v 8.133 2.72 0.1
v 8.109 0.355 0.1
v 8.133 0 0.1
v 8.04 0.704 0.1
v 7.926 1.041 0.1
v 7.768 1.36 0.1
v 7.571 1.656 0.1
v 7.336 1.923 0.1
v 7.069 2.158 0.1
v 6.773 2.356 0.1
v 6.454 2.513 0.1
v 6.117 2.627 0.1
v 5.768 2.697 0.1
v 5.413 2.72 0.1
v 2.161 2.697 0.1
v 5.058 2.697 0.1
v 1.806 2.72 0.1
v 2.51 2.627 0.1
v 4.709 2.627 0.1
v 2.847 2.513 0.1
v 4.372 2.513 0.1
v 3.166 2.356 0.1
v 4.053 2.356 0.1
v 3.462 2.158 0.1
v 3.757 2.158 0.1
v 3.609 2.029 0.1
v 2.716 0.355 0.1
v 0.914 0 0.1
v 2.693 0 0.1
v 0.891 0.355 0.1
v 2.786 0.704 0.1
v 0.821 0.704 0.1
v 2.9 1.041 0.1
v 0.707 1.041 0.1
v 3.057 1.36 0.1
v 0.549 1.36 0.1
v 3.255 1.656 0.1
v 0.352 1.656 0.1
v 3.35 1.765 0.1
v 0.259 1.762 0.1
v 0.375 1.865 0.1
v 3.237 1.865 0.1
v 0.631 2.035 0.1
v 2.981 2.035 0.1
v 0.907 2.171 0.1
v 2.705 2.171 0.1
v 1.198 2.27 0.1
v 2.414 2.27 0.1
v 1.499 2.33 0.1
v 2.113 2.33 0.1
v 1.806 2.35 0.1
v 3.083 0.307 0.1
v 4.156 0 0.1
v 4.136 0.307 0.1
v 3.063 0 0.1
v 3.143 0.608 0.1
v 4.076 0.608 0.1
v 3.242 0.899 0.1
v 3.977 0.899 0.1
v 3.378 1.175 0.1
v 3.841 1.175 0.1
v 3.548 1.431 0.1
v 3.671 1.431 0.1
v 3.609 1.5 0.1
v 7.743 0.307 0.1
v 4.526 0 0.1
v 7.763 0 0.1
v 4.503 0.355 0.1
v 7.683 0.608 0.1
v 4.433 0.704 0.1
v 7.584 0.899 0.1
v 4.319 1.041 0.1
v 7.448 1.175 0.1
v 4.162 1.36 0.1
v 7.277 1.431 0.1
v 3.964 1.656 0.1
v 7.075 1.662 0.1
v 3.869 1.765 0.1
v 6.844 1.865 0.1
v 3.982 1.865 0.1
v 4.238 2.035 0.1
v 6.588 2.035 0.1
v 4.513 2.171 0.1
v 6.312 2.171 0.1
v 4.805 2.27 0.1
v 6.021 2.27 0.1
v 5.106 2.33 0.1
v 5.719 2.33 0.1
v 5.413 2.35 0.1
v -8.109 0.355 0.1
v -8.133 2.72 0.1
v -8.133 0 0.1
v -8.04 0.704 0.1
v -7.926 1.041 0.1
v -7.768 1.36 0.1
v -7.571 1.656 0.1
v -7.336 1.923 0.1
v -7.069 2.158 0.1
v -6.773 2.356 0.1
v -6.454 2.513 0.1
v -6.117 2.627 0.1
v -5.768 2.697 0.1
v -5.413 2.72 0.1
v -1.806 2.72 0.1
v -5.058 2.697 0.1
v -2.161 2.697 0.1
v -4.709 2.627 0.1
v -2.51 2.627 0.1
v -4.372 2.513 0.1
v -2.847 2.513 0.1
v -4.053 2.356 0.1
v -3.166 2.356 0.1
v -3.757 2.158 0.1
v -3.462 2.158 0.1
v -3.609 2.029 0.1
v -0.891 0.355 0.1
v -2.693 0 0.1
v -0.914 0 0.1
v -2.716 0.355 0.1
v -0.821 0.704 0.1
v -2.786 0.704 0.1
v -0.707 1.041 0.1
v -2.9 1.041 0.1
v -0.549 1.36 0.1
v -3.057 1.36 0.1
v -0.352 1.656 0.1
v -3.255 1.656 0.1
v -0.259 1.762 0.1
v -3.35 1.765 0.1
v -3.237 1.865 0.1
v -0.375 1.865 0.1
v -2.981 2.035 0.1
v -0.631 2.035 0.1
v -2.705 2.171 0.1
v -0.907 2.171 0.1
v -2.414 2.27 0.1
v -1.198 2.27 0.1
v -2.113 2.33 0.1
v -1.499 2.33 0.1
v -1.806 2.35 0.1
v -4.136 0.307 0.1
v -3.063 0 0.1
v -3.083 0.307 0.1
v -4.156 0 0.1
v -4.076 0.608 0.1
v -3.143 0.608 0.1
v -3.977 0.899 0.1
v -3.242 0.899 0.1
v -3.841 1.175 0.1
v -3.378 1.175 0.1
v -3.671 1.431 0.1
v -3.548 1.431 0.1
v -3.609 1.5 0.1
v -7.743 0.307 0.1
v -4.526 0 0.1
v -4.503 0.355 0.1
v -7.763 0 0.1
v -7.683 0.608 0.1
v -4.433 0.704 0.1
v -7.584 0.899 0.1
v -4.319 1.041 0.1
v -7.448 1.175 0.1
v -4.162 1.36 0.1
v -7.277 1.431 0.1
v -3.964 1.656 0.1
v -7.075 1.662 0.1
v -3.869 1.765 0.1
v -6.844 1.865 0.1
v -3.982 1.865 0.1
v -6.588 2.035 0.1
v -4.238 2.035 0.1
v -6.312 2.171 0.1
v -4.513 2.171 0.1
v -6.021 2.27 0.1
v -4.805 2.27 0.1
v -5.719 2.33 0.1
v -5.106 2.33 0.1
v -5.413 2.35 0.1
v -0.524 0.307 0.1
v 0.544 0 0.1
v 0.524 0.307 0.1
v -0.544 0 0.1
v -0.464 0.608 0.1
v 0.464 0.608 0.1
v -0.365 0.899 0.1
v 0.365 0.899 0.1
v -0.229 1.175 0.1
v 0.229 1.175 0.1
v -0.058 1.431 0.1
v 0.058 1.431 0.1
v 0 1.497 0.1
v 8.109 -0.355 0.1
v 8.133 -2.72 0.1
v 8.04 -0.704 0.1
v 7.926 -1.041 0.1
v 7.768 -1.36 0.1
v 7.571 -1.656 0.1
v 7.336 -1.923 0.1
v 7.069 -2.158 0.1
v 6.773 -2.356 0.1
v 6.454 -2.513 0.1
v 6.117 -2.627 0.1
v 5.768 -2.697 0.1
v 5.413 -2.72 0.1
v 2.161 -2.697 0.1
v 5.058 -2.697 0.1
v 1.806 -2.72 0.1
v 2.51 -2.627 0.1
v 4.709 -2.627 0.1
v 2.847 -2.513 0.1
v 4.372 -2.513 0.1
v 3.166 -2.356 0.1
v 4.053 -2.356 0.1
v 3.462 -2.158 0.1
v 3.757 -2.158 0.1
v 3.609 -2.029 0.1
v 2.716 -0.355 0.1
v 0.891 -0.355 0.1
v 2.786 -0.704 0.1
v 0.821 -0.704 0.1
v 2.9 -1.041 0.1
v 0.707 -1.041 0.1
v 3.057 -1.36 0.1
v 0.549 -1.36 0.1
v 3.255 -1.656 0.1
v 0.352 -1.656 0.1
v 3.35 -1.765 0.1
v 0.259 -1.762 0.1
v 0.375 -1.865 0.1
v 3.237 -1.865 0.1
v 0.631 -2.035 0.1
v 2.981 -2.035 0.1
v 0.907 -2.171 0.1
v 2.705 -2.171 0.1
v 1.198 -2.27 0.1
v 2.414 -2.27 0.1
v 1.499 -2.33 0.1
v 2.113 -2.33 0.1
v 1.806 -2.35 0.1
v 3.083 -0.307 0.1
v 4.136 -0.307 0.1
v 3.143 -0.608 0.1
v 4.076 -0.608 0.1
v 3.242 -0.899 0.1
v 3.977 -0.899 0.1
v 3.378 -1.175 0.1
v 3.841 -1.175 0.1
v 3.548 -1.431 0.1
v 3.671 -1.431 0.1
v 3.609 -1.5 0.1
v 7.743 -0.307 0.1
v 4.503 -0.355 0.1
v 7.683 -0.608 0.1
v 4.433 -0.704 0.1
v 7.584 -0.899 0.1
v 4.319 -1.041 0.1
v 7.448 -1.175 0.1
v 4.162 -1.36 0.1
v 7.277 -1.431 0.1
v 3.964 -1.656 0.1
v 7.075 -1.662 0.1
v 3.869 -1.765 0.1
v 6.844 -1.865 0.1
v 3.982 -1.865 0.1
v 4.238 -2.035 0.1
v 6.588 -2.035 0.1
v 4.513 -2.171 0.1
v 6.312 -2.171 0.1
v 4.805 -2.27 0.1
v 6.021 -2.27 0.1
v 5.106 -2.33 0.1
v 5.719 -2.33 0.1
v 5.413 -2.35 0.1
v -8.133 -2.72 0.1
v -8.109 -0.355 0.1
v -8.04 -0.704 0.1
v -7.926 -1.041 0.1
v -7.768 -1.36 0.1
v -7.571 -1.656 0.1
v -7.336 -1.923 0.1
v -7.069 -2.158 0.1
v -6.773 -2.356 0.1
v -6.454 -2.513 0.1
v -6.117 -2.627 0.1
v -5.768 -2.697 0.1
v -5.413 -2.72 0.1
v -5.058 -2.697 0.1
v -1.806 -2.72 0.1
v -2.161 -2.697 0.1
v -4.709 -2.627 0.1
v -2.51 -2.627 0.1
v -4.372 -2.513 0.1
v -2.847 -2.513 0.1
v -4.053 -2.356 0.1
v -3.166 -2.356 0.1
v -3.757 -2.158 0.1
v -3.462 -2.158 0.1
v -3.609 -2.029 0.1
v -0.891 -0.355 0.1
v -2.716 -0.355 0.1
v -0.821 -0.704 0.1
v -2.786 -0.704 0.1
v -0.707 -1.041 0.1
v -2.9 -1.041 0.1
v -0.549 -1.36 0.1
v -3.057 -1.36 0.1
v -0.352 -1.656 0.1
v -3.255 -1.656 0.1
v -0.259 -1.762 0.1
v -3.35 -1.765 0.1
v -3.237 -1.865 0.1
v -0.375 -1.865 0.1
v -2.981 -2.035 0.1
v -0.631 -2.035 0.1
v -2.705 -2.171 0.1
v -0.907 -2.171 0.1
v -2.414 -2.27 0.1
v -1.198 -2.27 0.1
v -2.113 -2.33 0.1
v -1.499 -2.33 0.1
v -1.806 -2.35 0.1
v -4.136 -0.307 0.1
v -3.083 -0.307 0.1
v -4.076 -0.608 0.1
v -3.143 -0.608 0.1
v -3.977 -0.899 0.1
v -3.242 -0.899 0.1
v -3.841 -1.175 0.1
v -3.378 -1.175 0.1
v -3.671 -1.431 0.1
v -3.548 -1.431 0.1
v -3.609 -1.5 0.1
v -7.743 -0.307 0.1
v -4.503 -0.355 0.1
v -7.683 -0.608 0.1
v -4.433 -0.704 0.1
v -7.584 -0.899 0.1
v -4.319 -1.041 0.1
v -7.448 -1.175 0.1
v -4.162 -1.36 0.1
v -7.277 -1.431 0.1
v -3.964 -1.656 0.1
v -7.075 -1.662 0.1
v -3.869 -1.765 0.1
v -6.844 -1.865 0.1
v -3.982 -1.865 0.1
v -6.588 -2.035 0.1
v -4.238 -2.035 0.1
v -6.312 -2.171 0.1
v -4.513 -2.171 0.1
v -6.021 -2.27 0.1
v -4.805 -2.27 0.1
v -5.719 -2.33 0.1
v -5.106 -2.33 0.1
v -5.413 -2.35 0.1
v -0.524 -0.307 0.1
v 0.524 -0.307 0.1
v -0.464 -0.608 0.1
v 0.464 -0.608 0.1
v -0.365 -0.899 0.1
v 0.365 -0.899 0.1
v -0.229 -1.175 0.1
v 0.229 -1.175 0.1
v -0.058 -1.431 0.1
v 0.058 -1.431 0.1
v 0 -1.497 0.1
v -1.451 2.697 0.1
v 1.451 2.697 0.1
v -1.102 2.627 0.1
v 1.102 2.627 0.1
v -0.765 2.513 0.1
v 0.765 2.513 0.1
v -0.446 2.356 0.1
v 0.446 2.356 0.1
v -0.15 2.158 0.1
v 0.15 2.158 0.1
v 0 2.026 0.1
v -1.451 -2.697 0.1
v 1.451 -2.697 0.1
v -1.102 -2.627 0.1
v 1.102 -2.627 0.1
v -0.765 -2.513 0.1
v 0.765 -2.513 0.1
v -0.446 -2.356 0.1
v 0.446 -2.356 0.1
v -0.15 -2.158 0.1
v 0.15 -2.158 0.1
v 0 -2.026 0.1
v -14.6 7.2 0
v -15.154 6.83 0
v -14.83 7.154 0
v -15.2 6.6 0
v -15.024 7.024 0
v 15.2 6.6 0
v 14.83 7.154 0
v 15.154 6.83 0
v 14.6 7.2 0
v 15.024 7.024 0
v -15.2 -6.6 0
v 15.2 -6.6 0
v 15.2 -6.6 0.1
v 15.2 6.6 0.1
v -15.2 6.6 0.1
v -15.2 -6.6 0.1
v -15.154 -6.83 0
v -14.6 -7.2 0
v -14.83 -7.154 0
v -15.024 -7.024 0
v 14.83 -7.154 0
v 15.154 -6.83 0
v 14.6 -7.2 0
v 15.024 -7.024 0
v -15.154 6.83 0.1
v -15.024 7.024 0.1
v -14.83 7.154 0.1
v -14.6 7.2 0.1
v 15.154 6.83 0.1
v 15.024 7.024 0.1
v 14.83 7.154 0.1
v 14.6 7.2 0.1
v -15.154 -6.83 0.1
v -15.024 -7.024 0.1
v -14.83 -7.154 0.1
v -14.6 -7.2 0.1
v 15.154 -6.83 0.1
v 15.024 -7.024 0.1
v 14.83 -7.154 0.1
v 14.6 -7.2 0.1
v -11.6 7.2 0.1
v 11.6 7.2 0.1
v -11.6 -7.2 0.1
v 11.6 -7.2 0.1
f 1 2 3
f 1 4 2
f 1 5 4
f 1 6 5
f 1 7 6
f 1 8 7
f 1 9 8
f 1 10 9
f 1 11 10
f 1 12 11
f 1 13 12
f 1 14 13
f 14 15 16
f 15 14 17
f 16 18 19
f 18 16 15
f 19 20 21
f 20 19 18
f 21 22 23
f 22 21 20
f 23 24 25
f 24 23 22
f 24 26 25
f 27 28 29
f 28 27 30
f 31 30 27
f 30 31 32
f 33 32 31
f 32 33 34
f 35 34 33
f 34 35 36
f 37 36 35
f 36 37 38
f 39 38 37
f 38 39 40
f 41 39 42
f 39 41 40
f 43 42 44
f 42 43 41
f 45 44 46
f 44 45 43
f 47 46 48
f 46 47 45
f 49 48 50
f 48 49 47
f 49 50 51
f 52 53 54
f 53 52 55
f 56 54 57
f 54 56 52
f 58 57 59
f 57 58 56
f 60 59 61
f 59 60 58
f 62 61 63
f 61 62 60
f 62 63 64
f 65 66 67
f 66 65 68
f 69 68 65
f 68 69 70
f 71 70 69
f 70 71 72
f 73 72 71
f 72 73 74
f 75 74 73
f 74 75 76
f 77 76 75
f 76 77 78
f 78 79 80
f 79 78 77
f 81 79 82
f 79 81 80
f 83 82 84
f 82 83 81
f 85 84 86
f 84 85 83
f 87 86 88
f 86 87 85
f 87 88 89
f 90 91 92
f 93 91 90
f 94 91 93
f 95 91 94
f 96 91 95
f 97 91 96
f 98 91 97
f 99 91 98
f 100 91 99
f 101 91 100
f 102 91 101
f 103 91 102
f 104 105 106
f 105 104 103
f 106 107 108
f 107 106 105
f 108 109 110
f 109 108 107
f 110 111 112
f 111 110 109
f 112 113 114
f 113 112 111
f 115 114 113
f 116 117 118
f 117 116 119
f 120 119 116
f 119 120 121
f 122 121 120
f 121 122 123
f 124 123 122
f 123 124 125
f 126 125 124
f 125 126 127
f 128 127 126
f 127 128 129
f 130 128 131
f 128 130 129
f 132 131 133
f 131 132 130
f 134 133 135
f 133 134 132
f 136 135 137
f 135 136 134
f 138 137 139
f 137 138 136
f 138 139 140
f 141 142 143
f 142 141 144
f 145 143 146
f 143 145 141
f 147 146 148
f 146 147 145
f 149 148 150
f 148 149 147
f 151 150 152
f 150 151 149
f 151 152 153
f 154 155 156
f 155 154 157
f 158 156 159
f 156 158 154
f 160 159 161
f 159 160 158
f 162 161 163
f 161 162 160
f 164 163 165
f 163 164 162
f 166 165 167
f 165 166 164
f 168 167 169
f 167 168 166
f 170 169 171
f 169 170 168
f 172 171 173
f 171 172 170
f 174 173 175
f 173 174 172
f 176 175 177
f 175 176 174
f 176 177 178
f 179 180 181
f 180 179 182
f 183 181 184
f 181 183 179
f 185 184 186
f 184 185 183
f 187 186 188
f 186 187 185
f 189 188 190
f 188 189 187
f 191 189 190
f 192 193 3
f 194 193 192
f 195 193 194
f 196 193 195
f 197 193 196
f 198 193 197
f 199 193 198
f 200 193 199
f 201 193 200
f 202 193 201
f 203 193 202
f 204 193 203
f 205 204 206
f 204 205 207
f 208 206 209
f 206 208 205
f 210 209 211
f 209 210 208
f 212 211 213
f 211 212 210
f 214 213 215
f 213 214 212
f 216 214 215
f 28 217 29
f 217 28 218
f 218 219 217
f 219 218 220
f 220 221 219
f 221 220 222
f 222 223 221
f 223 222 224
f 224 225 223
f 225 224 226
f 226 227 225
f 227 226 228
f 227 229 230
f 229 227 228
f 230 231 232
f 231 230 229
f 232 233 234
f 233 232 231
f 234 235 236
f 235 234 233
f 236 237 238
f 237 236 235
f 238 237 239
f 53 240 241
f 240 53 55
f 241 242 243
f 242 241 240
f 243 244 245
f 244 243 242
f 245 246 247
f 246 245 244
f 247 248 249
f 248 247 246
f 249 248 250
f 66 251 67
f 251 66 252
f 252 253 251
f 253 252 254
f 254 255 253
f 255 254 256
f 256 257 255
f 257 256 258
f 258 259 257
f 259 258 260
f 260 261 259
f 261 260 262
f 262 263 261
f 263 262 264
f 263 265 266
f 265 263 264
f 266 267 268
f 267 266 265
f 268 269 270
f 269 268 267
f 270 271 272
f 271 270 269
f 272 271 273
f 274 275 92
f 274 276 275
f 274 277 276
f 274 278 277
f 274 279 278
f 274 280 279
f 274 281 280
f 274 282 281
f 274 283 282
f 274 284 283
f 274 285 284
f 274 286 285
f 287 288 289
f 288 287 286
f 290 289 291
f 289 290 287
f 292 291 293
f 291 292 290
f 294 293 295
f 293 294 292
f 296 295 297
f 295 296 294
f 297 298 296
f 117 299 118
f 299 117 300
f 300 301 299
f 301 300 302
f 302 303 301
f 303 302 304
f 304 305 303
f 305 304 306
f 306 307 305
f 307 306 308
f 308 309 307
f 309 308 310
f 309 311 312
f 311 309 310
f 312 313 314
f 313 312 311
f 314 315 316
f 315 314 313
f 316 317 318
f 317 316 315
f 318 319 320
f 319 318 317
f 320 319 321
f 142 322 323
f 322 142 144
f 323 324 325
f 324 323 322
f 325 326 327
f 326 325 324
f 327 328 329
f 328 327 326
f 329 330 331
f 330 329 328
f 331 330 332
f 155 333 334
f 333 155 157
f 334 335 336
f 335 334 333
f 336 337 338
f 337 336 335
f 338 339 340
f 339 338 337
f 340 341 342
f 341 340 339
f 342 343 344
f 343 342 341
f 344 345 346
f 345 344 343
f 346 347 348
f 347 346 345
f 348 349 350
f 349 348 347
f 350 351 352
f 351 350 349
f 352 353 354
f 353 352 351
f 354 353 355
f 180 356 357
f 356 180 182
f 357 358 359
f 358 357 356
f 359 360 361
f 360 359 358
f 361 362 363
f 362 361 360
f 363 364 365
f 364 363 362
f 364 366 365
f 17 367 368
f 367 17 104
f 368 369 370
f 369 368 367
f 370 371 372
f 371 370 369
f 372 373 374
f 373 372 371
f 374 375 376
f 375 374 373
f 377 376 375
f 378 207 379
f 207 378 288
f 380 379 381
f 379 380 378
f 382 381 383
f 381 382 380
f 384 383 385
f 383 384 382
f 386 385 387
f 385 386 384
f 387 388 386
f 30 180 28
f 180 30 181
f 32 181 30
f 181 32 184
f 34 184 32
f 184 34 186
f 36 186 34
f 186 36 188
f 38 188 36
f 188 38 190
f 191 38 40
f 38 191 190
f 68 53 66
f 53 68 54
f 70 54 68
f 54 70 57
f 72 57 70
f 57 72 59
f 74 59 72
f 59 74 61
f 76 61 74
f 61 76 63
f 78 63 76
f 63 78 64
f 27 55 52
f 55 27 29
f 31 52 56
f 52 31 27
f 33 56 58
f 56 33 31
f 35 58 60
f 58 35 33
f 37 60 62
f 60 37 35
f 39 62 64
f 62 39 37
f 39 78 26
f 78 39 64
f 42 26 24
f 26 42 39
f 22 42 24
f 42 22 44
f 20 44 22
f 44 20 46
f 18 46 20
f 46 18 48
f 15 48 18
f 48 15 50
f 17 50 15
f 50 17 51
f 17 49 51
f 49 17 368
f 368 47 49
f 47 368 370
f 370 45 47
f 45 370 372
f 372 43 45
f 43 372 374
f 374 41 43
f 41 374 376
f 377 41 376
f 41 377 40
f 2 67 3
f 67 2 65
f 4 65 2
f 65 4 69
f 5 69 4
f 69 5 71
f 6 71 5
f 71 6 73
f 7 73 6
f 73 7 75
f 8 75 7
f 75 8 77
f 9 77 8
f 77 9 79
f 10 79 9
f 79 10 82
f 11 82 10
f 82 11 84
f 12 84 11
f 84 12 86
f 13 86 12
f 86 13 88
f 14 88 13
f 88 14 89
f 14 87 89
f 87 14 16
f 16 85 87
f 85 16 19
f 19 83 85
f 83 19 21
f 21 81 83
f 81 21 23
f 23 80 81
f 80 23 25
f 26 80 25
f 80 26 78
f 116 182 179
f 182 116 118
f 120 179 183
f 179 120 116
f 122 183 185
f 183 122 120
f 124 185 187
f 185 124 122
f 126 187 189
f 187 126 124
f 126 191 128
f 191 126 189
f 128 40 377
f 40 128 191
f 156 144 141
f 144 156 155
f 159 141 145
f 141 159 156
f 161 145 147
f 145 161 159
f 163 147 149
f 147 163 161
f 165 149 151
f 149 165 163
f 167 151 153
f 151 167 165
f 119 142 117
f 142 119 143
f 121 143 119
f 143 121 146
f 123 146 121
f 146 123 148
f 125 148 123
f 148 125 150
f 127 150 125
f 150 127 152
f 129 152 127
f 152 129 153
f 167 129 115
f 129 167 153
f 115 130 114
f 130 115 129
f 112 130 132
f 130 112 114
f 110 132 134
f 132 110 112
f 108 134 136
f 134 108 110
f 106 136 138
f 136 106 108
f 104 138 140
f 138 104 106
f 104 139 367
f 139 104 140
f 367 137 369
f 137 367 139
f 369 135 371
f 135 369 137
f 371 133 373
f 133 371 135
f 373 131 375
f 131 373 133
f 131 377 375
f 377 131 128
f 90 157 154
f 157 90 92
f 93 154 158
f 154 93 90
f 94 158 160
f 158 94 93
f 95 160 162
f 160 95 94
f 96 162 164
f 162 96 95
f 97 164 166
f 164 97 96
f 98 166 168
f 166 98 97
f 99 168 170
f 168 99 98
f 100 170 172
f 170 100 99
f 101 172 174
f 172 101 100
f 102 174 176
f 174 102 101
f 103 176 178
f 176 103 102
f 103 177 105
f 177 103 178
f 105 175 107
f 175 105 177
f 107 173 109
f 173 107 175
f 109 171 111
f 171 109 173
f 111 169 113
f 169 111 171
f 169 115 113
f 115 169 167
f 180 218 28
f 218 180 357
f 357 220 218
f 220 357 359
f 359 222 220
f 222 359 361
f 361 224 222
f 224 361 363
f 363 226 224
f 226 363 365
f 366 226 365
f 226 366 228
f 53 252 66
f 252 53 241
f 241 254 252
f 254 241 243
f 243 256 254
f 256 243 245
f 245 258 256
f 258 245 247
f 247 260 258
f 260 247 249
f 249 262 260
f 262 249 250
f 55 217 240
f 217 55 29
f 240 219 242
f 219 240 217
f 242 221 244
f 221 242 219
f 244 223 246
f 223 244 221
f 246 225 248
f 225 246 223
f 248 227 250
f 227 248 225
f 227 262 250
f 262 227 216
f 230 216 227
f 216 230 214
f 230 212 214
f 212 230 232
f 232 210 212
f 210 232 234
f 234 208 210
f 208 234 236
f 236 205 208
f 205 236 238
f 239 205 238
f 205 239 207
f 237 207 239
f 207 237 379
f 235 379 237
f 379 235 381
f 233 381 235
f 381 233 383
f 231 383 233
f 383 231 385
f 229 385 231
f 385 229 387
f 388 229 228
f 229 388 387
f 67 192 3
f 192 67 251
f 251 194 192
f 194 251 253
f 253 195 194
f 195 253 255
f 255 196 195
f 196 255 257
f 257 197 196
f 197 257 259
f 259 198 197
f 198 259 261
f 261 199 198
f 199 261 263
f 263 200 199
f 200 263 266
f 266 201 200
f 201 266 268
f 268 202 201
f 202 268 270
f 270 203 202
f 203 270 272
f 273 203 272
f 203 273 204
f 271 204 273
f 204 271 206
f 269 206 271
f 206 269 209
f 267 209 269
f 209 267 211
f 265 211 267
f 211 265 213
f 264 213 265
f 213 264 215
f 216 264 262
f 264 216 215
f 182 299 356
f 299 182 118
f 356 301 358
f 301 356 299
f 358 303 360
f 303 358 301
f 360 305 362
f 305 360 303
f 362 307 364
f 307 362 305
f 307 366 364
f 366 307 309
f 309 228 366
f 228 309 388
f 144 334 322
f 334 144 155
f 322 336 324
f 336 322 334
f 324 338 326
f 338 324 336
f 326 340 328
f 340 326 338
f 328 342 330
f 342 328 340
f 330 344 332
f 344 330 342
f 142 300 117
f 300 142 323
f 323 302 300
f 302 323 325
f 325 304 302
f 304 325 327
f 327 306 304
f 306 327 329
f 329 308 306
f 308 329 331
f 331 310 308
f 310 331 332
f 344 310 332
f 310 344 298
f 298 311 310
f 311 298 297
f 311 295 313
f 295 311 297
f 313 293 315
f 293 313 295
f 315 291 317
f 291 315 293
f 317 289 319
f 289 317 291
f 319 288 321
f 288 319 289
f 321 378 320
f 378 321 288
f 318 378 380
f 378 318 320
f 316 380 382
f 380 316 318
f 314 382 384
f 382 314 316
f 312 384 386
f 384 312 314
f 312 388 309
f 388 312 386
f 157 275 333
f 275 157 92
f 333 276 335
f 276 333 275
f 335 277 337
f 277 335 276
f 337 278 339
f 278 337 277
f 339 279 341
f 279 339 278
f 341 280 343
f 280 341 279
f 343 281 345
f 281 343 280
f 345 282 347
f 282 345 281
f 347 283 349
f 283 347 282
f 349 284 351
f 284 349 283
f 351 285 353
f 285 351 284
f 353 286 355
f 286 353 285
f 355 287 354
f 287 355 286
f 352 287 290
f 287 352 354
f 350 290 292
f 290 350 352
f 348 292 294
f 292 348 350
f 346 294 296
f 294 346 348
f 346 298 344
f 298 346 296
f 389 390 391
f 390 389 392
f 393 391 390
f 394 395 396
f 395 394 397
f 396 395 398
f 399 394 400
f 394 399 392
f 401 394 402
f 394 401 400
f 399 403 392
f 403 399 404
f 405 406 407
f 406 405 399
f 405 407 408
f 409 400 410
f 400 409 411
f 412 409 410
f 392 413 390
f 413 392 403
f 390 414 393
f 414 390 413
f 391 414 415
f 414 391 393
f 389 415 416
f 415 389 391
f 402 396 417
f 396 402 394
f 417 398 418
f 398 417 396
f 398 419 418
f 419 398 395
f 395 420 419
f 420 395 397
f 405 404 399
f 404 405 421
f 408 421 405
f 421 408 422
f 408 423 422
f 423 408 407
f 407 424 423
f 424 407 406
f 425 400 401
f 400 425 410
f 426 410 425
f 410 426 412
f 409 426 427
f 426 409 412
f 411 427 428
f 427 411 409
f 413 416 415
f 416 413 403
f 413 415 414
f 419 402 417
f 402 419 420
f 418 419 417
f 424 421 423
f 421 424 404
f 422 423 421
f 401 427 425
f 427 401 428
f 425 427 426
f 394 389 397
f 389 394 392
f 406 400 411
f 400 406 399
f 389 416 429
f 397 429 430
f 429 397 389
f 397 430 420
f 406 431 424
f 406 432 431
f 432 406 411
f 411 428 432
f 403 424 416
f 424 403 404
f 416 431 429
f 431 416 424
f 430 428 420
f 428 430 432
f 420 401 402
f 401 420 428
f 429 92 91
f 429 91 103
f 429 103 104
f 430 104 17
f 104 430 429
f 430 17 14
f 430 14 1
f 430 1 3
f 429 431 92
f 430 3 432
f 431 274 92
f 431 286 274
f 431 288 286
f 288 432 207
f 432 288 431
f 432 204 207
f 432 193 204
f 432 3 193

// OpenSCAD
use <../lib.scad>
use <../p/1-4chrd.scad>
use <../p/1-4cyli.scad>
use <../p/box3u12.scad>
use <../p/logo-audi-ring-outerbox.scad>
use <../p/logo-audi-ring.scad>
function ldraw_lib__6142271j() = [
// 0 Sticker  1.8 x  3.8 with White Audi Logo on Red Stripe on White Background
// 0 Name: 6142271j.dat
// 0 Author: Massimo Maso [Sirio]
// 0 !LDRAW_ORG Part UPDATE 2025-02
// 0 !LICENSE Licensed under CC BY 4.0 : see CAreadme.txt
// 
// 0 BFC CERTIFY CCW
  [0,"BFC","CERTIFY"],
  [0,"BFC","CCW"],
// 
// 0 !KEYWORDS Bricklink 75873stk01a, Brickowl 427960, LMS, R8, Rebrickable 24755
// 0 !KEYWORDS Set 75873, Speed Champions, Ultra
// 
// 0 !HISTORY 2025-02-27 [OrionP] Official Update 2025-02
// 
// 0 // Logo primitives
// 1 4 0 -.25 0 .68 0 0 0 1 0 0 0 .68 logo-audi-ring-outerbox.dat
  [1,4,0,-.25,0,.68,0,0,0,1,0,0,0,.68, ldraw_lib__logo_audi_ring_outerbox()],
// 1 15 0 -.25 0 .68 0 0 0 1 0 0 0 .68 logo-audi-ring.dat
  [1,15,0,-.25,0,.68,0,0,0,1,0,0,0,.68, ldraw_lib__logo_audi_ring()],
// 0 // Primitives
// 1 16 -36.5 0 16.5 -1.5 0 0 0 -1 0 0 0 1.5 1-4chrd.dat
  [1,16,-36.5,0,16.5,-1.5,0,0,0,-1,0,0,0,1.5, ldraw_lib__1_4chrd()],
// 1 16 36.5 0 16.5 1.5 0 0 0 -1 0 0 0 1.5 1-4chrd.dat
  [1,16,36.5,0,16.5,1.5,0,0,0,-1,0,0,0,1.5, ldraw_lib__1_4chrd()],
// 1 16 0 -.25 0 0 0 38 0 .25 0 16.5 0 0 box3u12.dat
  [1,16,0,-.25,0,0,0,38,0,.25,0,16.5,0,0, ldraw_lib__box3u12()],
// 1 16 -36.5 0 -16.5 -1.5 0 0 0 -1 0 0 0 -1.5 1-4chrd.dat
  [1,16,-36.5,0,-16.5,-1.5,0,0,0,-1,0,0,0,-1.5, ldraw_lib__1_4chrd()],
// 1 16 36.5 0 -16.5 1.5 0 0 0 -1 0 0 0 -1.5 1-4chrd.dat
  [1,16,36.5,0,-16.5,1.5,0,0,0,-1,0,0,0,-1.5, ldraw_lib__1_4chrd()],
// 1 16 -36.5 0 16.5 -1.5 0 0 0 -.25 0 0 0 1.5 1-4cyli.dat
  [1,16,-36.5,0,16.5,-1.5,0,0,0,-.25,0,0,0,1.5, ldraw_lib__1_4cyli()],
// 1 16 36.5 0 16.5 1.5 0 0 0 -.25 0 0 0 1.5 1-4cyli.dat
  [1,16,36.5,0,16.5,1.5,0,0,0,-.25,0,0,0,1.5, ldraw_lib__1_4cyli()],
// 1 16 -36.5 0 -16.5 -1.5 0 0 0 -.25 0 0 0 -1.5 1-4cyli.dat
  [1,16,-36.5,0,-16.5,-1.5,0,0,0,-.25,0,0,0,-1.5, ldraw_lib__1_4cyli()],
// 1 16 36.5 0 -16.5 1.5 0 0 0 -.25 0 0 0 -1.5 1-4cyli.dat
  [1,16,36.5,0,-16.5,1.5,0,0,0,-.25,0,0,0,-1.5, ldraw_lib__1_4cyli()],
// 1 15 -36.5 -.25 16.5 -1.5 0 0 0 1 0 0 0 1.5 1-4chrd.dat
  [1,15,-36.5,-.25,16.5,-1.5,0,0,0,1,0,0,0,1.5, ldraw_lib__1_4chrd()],
// 1 15 36.5 -.25 16.5 1.5 0 0 0 1 0 0 0 1.5 1-4chrd.dat
  [1,15,36.5,-.25,16.5,1.5,0,0,0,1,0,0,0,1.5, ldraw_lib__1_4chrd()],
// 1 15 -36.5 -.25 -16.5 -1.5 0 0 0 1 0 0 0 -1.5 1-4chrd.dat
  [1,15,-36.5,-.25,-16.5,-1.5,0,0,0,1,0,0,0,-1.5, ldraw_lib__1_4chrd()],
// 1 15 36.5 -.25 -16.5 1.5 0 0 0 1 0 0 0 -1.5 1-4chrd.dat
  [1,15,36.5,-.25,-16.5,1.5,0,0,0,1,0,0,0,-1.5, ldraw_lib__1_4chrd()],
// 0 // Bottom faces
// 4 16 36.5 0 18 38 0 16.5 -38 0 16.5 -36.5 0 18
  [4,16,36.5,0,18,38,0,16.5,-38,0,16.5,-36.5,0,18],
// 4 16 36.5 0 -18 -36.5 0 -18 -38 0 -16.5 38 0 -16.5
  [4,16,36.5,0,-18,-36.5,0,-18,-38,0,-16.5,38,0,-16.5],
// 0 // Lateral faces
// 3 16 -36.5 0 18 -36.5 -.25 18 -29 -.25 18
  [3,16,-36.5,0,18,-36.5,-.25,18,-29,-.25,18],
// 4 16 -36.5 0 18 -29 -.25 18 29 -.25 18 36.5 0 18
  [4,16,-36.5,0,18,-29,-.25,18,29,-.25,18,36.5,0,18],
// 3 16 36.5 0 18 29 -.25 18 36.5 -.25 18
  [3,16,36.5,0,18,29,-.25,18,36.5,-.25,18],
// 3 16 -36.5 0 -18 -29 -.25 -18 -36.5 -.25 -18
  [3,16,-36.5,0,-18,-29,-.25,-18,-36.5,-.25,-18],
// 4 16 -36.5 0 -18 36.5 0 -18 29 -.25 -18 -29 -.25 -18
  [4,16,-36.5,0,-18,36.5,0,-18,29,-.25,-18,-29,-.25,-18],
// 3 16 36.5 0 -18 36.5 -.25 -18 29 -.25 -18
  [3,16,36.5,0,-18,36.5,-.25,-18,29,-.25,-18],
// 0 // White top faces
// 4 15 -36.5 -.25 18 -38 -.25 16.5 -38 -.25 -16.5 -36.5 -.25 -18
  [4,15,-36.5,-.25,18,-38,-.25,16.5,-38,-.25,-16.5,-36.5,-.25,-18],
// 4 15 -36.5 -.25 18 -36.5 -.25 -18 -29 -.25 -18 -29 -.25 18
  [4,15,-36.5,-.25,18,-36.5,-.25,-18,-29,-.25,-18,-29,-.25,18],
// 4 15 36.5 -.25 18 29 -.25 18 29 -.25 -18 36.5 -.25 -18
  [4,15,36.5,-.25,18,29,-.25,18,29,-.25,-18,36.5,-.25,-18],
// 4 15 36.5 -.25 18 36.5 -.25 -18 38 -.25 -16.5 38 -.25 16.5
  [4,15,36.5,-.25,18,36.5,-.25,-18,38,-.25,-16.5,38,-.25,16.5],
// 0 // Red top faces
// 3 4 -29 -.25 18 -20.332 -.25 0 -20.332 -.25 6.8
  [3,4,-29,-.25,18,-20.332,-.25,0,-20.332,-.25,6.8],
// 3 4 -29 -.25 18 -20.332 -.25 6.8 -13.532 -.25 6.8
  [3,4,-29,-.25,18,-20.332,-.25,6.8,-13.532,-.25,6.8],
// 3 4 -29 -.25 18 -13.532 -.25 6.8 -4.5152 -.25 6.8
  [3,4,-29,-.25,18,-13.532,-.25,6.8,-4.5152,-.25,6.8],
// 4 4 -29 -.25 18 -4.5152 -.25 6.8 4.5152 -.25 6.8 29 -.25 18
  [4,4,-29,-.25,18,-4.5152,-.25,6.8,4.5152,-.25,6.8,29,-.25,18],
// 3 4 29 -.25 18 4.5152 -.25 6.8 13.532 -.25 6.8
  [3,4,29,-.25,18,4.5152,-.25,6.8,13.532,-.25,6.8],
// 3 4 29 -.25 18 13.532 -.25 6.8 20.332 -.25 6.8
  [3,4,29,-.25,18,13.532,-.25,6.8,20.332,-.25,6.8],
// 3 4 29 -.25 18 20.332 -.25 6.8 20.332 -.25 0
  [3,4,29,-.25,18,20.332,-.25,6.8,20.332,-.25,0],
// 3 4 -29 -.25 18 -29 -.25 -18 -20.332 -.25 0
  [3,4,-29,-.25,18,-29,-.25,-18,-20.332,-.25,0],
// 3 4 29 -.25 18 20.332 -.25 0 29 -.25 -18
  [3,4,29,-.25,18,20.332,-.25,0,29,-.25,-18],
// 3 4 -29 -.25 -18 -20.332 -.25 -6.8 -20.332 -.25 0
  [3,4,-29,-.25,-18,-20.332,-.25,-6.8,-20.332,-.25,0],
// 3 4 -29 -.25 -18 -13.532 -.25 -6.8 -20.332 -.25 -6.8
  [3,4,-29,-.25,-18,-13.532,-.25,-6.8,-20.332,-.25,-6.8],
// 3 4 -29 -.25 -18 -4.5152 -.25 -6.8 -13.532 -.25 -6.8
  [3,4,-29,-.25,-18,-4.5152,-.25,-6.8,-13.532,-.25,-6.8],
// 4 4 -29 -.25 -18 29 -.25 -18 4.5152 -.25 -6.8 -4.5152 -.25 -6.8
  [4,4,-29,-.25,-18,29,-.25,-18,4.5152,-.25,-6.8,-4.5152,-.25,-6.8],
// 3 4 29 -.25 -18 13.532 -.25 -6.8 4.5152 -.25 -6.8
  [3,4,29,-.25,-18,13.532,-.25,-6.8,4.5152,-.25,-6.8],
// 3 4 29 -.25 -18 20.332 -.25 -6.8 13.532 -.25 -6.8
  [3,4,29,-.25,-18,20.332,-.25,-6.8,13.532,-.25,-6.8],
// 3 4 29 -.25 -18 20.332 -.25 0 20.332 -.25 -6.8
  [3,4,29,-.25,-18,20.332,-.25,0,20.332,-.25,-6.8],
];
module ldraw_lib__6142271j(step=0, col=false, unit=2/5, alt=false, line=0.2, solid=!$preview)
    makepoly(ldraw_lib__6142271j(), step=step, col=col, unit=unit, alt=alt, line=line, solid=solid);
ldraw_lib__6142271j(line=0.2);
